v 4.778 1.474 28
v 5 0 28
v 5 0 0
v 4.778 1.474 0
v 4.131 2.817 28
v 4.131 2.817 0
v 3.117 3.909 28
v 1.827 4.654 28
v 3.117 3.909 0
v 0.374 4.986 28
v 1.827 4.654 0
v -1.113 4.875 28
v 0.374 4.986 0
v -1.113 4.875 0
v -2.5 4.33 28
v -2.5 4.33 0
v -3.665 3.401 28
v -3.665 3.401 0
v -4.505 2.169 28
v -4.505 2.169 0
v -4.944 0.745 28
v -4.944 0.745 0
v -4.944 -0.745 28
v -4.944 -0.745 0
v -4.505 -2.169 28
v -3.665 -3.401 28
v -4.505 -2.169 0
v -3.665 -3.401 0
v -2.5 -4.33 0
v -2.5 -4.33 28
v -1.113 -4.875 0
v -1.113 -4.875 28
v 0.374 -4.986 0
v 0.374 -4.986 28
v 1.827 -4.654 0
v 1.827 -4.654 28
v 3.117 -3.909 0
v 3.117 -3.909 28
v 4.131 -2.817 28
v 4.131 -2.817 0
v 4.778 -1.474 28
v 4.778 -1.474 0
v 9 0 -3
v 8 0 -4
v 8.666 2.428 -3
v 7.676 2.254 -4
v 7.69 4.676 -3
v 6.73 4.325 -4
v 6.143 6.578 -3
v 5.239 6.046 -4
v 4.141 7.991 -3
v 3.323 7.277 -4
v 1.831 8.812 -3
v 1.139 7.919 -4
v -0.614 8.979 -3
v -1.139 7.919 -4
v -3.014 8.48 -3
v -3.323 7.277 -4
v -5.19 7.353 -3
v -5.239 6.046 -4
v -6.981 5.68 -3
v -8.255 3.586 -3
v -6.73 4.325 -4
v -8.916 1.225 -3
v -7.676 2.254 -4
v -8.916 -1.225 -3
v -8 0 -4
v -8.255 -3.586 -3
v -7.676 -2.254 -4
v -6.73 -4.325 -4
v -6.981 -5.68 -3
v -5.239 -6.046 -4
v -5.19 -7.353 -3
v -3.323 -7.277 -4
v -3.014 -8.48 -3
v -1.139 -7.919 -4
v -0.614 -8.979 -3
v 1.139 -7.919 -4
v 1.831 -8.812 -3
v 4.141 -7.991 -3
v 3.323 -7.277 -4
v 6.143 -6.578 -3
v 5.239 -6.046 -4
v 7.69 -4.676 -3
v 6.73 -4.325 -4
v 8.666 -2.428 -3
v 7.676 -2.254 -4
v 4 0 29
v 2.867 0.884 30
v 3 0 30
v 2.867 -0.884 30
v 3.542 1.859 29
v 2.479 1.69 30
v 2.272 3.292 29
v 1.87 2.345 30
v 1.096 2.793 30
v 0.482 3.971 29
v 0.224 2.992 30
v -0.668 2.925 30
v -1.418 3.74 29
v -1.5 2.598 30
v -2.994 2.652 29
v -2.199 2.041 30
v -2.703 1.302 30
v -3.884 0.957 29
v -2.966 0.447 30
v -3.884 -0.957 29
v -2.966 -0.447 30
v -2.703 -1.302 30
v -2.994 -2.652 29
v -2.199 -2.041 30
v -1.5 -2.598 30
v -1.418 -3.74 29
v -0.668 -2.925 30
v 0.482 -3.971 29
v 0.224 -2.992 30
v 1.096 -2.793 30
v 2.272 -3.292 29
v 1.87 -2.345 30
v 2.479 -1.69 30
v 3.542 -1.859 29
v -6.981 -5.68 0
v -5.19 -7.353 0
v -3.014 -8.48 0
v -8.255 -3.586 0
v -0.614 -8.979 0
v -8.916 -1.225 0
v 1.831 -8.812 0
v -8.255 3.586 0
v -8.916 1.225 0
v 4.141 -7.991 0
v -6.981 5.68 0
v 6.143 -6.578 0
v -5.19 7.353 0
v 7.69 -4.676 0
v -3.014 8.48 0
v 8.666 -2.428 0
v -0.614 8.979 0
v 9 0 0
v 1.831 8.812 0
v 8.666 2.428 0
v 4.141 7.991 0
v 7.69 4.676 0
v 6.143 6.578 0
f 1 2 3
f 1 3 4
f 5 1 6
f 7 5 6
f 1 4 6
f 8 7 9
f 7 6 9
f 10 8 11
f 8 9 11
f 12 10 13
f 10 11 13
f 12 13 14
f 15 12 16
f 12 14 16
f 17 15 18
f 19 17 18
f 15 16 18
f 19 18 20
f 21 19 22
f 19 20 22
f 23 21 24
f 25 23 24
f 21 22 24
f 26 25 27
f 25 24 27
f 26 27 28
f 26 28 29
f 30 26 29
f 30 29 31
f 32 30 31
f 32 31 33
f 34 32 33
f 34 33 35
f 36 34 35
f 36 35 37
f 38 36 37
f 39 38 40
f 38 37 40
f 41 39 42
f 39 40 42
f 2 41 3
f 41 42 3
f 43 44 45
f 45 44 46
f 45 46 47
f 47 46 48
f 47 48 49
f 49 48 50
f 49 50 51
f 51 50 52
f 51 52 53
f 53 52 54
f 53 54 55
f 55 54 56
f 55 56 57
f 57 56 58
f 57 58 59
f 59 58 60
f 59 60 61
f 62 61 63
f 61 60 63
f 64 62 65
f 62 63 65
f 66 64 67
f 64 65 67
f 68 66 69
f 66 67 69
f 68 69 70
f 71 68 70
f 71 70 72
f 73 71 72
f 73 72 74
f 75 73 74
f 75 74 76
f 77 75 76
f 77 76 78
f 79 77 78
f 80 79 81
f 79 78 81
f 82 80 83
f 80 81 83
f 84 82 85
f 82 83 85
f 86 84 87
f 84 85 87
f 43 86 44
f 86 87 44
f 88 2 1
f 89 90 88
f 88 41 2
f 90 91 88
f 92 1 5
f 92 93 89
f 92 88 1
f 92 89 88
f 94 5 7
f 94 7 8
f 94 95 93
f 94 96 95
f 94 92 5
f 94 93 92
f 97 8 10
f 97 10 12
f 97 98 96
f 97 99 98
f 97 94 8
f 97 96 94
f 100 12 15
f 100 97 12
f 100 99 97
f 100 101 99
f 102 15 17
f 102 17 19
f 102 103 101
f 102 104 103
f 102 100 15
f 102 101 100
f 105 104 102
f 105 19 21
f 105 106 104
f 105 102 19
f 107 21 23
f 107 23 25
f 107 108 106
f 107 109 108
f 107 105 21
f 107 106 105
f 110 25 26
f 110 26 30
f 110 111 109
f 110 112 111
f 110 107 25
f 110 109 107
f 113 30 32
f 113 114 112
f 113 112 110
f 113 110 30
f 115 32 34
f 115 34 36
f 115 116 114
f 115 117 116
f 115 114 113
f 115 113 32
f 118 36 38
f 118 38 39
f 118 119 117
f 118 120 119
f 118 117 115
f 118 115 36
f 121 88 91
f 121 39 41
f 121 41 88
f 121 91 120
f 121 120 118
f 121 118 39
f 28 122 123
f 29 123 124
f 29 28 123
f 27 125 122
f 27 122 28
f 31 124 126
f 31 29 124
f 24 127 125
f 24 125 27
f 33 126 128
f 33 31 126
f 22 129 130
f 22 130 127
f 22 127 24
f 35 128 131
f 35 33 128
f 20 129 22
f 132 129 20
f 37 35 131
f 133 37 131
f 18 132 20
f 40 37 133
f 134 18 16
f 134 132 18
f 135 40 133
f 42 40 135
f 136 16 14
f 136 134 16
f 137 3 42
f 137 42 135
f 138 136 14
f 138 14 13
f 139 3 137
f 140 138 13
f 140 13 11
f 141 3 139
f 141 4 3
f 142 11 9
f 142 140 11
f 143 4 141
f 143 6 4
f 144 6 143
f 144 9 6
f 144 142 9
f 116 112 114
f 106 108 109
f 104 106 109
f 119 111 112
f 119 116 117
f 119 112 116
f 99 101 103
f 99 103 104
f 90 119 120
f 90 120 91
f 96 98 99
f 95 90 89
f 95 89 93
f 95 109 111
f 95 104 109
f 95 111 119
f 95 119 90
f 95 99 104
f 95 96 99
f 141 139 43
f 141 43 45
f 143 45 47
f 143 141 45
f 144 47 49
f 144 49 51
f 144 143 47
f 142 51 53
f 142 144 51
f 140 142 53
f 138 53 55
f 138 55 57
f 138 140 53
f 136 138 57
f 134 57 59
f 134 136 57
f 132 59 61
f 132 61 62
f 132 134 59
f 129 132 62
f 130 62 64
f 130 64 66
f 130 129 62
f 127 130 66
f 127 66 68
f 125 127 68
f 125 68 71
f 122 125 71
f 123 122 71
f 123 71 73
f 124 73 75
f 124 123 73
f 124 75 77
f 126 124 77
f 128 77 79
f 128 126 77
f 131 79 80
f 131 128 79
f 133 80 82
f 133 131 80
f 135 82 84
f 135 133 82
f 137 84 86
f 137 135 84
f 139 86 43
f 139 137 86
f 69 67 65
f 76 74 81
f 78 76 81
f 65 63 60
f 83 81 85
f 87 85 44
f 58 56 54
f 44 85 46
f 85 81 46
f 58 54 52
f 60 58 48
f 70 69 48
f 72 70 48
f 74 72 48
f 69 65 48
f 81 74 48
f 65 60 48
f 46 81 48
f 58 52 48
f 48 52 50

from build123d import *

# Parameters (mm, degrees)
SKETCH2_R           = 5
BOSS_EXTRUDE1_DEPTH = 30
SKETCH1_R           = 9
BASE_EXTRUDE_DEPTH  = 4
CHAMFER1_SIZE       = 1
CHAMFER2_SIZE       = 2


with BuildPart() as part:
    # Sketch2 (on Front Plane) → Boss-Extrude1 (new body)
    with BuildSketch(Plane.XY):
        Circle(SKETCH2_R)
    extrude(amount=BOSS_EXTRUDE1_DEPTH)

    # Sketch1 → Base-Extrude (add)
    with BuildSketch(Plane.XY):
        Circle(SKETCH1_R)
    extrude(amount=-BASE_EXTRUDE_DEPTH)

    # Chamfer1
    chamfer1_edges = [part.edges().sort_by_distance(p)[0] for p in [
        (-9, 0, -4),
    ]]
    chamfer(chamfer1_edges, length=CHAMFER1_SIZE)

    # Chamfer2
    chamfer2_edges = [part.edges().sort_by_distance(p)[0] for p in [
        (-5, 0, 30),
    ]]
    chamfer(chamfer2_edges, length=CHAMFER2_SIZE)


solid = part.part
